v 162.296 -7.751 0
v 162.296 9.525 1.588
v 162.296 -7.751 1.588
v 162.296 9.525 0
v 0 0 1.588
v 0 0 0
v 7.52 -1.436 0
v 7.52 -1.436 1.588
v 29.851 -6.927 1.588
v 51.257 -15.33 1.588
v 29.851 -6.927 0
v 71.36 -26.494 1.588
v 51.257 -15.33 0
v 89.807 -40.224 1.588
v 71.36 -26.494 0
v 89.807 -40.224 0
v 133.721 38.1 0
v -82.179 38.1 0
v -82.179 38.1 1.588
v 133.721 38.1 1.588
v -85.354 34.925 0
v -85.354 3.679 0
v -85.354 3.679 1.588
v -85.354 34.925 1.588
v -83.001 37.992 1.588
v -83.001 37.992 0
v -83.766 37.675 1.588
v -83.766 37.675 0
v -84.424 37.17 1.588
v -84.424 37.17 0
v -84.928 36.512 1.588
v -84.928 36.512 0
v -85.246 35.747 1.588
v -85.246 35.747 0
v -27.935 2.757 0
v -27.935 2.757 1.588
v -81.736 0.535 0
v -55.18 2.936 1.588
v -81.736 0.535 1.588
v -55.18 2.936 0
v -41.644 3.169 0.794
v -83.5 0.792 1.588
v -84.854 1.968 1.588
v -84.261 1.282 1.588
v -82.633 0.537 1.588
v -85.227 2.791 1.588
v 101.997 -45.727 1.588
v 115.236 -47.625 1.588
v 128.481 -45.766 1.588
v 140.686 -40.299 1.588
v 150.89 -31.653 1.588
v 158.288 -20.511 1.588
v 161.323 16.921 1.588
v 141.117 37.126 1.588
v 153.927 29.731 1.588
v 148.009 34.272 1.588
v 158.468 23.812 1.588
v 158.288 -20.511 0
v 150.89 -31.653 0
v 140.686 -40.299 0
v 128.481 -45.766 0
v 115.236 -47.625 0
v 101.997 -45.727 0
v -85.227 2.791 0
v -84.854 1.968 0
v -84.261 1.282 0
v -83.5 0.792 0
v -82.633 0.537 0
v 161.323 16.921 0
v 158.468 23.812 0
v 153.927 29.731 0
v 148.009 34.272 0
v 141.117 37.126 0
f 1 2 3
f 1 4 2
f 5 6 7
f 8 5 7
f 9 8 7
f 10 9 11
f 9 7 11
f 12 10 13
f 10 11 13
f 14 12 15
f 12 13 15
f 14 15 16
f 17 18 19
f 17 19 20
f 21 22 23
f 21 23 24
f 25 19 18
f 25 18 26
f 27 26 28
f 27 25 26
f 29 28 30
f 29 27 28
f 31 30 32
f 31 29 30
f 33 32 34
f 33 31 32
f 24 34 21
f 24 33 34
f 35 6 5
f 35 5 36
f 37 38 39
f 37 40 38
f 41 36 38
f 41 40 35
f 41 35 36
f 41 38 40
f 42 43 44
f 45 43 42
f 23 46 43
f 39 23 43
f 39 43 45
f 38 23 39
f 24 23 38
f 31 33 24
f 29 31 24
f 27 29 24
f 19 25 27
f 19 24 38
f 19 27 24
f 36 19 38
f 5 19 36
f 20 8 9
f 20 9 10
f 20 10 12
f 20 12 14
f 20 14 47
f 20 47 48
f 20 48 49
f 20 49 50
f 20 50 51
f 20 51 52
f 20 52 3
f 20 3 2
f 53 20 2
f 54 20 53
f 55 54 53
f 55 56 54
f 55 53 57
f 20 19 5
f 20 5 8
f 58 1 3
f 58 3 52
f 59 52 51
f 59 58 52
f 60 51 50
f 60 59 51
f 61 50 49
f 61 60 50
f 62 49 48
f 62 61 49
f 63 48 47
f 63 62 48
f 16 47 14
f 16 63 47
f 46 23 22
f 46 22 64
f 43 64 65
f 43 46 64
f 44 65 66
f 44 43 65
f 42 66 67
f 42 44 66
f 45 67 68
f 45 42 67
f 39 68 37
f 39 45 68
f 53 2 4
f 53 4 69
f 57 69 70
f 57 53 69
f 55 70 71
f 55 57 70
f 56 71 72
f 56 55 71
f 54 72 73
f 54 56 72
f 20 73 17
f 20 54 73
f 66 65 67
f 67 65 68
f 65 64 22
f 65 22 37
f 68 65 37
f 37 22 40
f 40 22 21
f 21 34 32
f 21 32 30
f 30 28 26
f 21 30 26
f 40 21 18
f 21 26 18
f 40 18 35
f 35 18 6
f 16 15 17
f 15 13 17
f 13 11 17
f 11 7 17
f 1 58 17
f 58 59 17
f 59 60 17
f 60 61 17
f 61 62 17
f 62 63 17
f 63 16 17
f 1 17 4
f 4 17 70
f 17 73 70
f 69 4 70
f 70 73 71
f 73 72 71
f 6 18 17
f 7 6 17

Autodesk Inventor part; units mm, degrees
ref_plane "YZ Plane" through (0, 0, 0) normal (1, 0, 0) x (0, 1, 0)
ref_plane "XZ Plane" through (0, 0, 0) normal (0, 1, 0) x (-1, 0, 0)
ref_plane "XY Plane" through (0, 0, 0) normal (0, 0, 1) x (1, 0, 0)
sketch "Sketch1" plane through (0, 0, 0) normal (0, 0, 1) x (1, 0, 0)
  line L0 (-85.3538, 38.1) -> (162.2962, 38.1)
  line L1 (162.2962, 38.1) -> (162.2962, 12.7)
  line L2 (162.2962, 12.7) -> (-85.3538, 12.7)
  line L3 (-85.3538, 12.7) -> (-85.3538, 38.1)
  line L4 (162.2962, 38.1) -> (115.3062, 38.1)
  line L5 (115.3062, 38.1) -> (115.3062, 0)
  line L6 (115.3062, 0) -> (162.2962, 0)
  line L7 (162.2962, 0) -> (162.2962, 38.1)
  circle A0 centre (-22.5792, -171.9682) radius 173.1686
  line L8 (-85.3538, 12.7) -> (-85.3538, 0)
  line L9 (0, 0) -> (-44.3742, 6.35) construction
  line L10 (-44.3742, 6.35) -> (-85.3538, 0) construction
  spline S0 degree 2 poles (0, 0) (-44.3742, 6.35) (-85.3538, 0) knots 1 1 1 2 2 2
  line L11 (81.5863, -33.6319) -> (69.4058, 12.7)
  line L12 (0, 0) -> (0, 12.7)
  line L13 (0, 0) -> (67.6812, 0)
  line L14 (0, 0) -> (67.6812, 0)
  line L15 (81.5863, -33.6319) -> (29.3756, 0)
  line L16 (0, 0) -> (29.3756, 0)
  line L17 (27.7818, -6.2843) -> (29.3756, 0)
  line L18 (27.7744, -6.2821) -> (21.0977, 0)
  line L19 (7.9763, 0) -> (27.7808, -6.2881)
  line L20 (7.9763, 0) -> (7.5205, -1.4355)
  line L21 (0, 0) -> (7.5205, -1.4355) construction
  spline S1 degree 1 poles (0, 0) (7.5205, -1.4355) knots 1 1 2 2
  line L22 (81.5863, -33.6319) -> (101.3506, -50.0871) construction
  line L23 (101.3506, -50.0871) -> (95.7634, -43.4306) construction
  spline S2 degree 2 poles (81.5863, -33.6319) (101.3506, -50.0871) (95.7634, -43.4306) knots 1 1 1 2 2 2
  line L24 (162.2962, 0) -> (162.2962, -7.7512)
  arc A1 (88.9377, -39.659) -> (162.2962, -7.7512) centre (115.3062, 0) ccw
  arc A2 (162.2962, 7.7512) -> (81.5863, -33.6319) centre (115.3062, 0) ccw
  point P0 (60.3061, -19.9241)
  point P1 (162.2962, 12.7)
  point P2 (115.3062, 12.7)
  point P3 (162.2962, 12.7)
  point P4 (27.497, -6.198)
  point P5 (29.3756, 0)
  point P6 (89.8079, -40.2241)
  dimension "d0" = 247.65
  dimension "d1" = 25.4
  dimension "d4" = 38.1
  dimension "d5" = 46.99
extrude "Extrusion2" add sketch "Sketch1" along normal blind 1.5875 contours L0 A2 L2 L3 | L0 L5 L2 A2 | L2 L12 S0 L8 | L0 A2 L2 L5 | L0 L1 L2 A2 | A2 L13 L12 L2 | L2 L5 L6 L24 A1 A0 L11 | L11 A2 | L2 A2 L7 L6 L5 | L2 L7 A2 | A0 L15 L13 A2 | L13 L20 S1 | A0 L17 L15 | L17 A0 L18 L13 | L13 L18 A0 L19 | L19 A0 L20
fillet "Fillet1" radius 28.575 1 edges at (162.2962, 38.1, 0.7937)
fillet "Fillet2" radius 3.175 1 edges at (-85.3538, 38.1, 0.7937)
fillet "Fillet3" radius 3.175 1 edges at (-85.3538, 0, 0.7937)
sketch "Sketch2" plane through (0, 0, 1.5875) normal (0, 0, 1) x (1, 0, 0)
  circle A0 centre (-77.0322, 20.6187) radius 2.54
  line L0 (-77.0322, 20.6187) -> (-77.0322, 7.9187)
  circle A1 centre (-77.0322, 7.9187) radius 2.54
  line L1 (-77.0322, 20.6187) -> (-13.5322, 20.6187)
  circle A2 centre (-13.5322, 20.6187) radius 2.54
  line L2 (-77.0322, 7.9187) -> (-13.5322, 7.9187)
  circle A3 centre (-13.5322, 7.9187) radius 2.54
  line L3 (-13.5322, 20.6187) -> (-13.5322, 14.2687)
  line L4 (-13.5322, 14.2687) -> (-7.1822, 14.2687)
  circle A4 centre (-7.1822, 14.2687) radius 2.54
  line L5 (-7.1822, 14.2687) -> (5.5178, 14.2687)
  circle A5 centre (5.5178, 14.2687) radius 2.54
  point P0 (0, 0)
  dimension "d15" = 5.08
  dimension "d16" = 12.7
  dimension "d17" = 5.08
  dimension "d18" = 63.5
  dimension "d19" = 5.08
  dimension "d20" = 5.08
  dimension "d21" = 63.5
  dimension "d22" = 6.35
  dimension "d23" = 6.35
  dimension "d24" = 5.08
  dimension "d25" = 12.7
  dimension "d26" = 5.08
properties part number "meers goofy intake sled"
